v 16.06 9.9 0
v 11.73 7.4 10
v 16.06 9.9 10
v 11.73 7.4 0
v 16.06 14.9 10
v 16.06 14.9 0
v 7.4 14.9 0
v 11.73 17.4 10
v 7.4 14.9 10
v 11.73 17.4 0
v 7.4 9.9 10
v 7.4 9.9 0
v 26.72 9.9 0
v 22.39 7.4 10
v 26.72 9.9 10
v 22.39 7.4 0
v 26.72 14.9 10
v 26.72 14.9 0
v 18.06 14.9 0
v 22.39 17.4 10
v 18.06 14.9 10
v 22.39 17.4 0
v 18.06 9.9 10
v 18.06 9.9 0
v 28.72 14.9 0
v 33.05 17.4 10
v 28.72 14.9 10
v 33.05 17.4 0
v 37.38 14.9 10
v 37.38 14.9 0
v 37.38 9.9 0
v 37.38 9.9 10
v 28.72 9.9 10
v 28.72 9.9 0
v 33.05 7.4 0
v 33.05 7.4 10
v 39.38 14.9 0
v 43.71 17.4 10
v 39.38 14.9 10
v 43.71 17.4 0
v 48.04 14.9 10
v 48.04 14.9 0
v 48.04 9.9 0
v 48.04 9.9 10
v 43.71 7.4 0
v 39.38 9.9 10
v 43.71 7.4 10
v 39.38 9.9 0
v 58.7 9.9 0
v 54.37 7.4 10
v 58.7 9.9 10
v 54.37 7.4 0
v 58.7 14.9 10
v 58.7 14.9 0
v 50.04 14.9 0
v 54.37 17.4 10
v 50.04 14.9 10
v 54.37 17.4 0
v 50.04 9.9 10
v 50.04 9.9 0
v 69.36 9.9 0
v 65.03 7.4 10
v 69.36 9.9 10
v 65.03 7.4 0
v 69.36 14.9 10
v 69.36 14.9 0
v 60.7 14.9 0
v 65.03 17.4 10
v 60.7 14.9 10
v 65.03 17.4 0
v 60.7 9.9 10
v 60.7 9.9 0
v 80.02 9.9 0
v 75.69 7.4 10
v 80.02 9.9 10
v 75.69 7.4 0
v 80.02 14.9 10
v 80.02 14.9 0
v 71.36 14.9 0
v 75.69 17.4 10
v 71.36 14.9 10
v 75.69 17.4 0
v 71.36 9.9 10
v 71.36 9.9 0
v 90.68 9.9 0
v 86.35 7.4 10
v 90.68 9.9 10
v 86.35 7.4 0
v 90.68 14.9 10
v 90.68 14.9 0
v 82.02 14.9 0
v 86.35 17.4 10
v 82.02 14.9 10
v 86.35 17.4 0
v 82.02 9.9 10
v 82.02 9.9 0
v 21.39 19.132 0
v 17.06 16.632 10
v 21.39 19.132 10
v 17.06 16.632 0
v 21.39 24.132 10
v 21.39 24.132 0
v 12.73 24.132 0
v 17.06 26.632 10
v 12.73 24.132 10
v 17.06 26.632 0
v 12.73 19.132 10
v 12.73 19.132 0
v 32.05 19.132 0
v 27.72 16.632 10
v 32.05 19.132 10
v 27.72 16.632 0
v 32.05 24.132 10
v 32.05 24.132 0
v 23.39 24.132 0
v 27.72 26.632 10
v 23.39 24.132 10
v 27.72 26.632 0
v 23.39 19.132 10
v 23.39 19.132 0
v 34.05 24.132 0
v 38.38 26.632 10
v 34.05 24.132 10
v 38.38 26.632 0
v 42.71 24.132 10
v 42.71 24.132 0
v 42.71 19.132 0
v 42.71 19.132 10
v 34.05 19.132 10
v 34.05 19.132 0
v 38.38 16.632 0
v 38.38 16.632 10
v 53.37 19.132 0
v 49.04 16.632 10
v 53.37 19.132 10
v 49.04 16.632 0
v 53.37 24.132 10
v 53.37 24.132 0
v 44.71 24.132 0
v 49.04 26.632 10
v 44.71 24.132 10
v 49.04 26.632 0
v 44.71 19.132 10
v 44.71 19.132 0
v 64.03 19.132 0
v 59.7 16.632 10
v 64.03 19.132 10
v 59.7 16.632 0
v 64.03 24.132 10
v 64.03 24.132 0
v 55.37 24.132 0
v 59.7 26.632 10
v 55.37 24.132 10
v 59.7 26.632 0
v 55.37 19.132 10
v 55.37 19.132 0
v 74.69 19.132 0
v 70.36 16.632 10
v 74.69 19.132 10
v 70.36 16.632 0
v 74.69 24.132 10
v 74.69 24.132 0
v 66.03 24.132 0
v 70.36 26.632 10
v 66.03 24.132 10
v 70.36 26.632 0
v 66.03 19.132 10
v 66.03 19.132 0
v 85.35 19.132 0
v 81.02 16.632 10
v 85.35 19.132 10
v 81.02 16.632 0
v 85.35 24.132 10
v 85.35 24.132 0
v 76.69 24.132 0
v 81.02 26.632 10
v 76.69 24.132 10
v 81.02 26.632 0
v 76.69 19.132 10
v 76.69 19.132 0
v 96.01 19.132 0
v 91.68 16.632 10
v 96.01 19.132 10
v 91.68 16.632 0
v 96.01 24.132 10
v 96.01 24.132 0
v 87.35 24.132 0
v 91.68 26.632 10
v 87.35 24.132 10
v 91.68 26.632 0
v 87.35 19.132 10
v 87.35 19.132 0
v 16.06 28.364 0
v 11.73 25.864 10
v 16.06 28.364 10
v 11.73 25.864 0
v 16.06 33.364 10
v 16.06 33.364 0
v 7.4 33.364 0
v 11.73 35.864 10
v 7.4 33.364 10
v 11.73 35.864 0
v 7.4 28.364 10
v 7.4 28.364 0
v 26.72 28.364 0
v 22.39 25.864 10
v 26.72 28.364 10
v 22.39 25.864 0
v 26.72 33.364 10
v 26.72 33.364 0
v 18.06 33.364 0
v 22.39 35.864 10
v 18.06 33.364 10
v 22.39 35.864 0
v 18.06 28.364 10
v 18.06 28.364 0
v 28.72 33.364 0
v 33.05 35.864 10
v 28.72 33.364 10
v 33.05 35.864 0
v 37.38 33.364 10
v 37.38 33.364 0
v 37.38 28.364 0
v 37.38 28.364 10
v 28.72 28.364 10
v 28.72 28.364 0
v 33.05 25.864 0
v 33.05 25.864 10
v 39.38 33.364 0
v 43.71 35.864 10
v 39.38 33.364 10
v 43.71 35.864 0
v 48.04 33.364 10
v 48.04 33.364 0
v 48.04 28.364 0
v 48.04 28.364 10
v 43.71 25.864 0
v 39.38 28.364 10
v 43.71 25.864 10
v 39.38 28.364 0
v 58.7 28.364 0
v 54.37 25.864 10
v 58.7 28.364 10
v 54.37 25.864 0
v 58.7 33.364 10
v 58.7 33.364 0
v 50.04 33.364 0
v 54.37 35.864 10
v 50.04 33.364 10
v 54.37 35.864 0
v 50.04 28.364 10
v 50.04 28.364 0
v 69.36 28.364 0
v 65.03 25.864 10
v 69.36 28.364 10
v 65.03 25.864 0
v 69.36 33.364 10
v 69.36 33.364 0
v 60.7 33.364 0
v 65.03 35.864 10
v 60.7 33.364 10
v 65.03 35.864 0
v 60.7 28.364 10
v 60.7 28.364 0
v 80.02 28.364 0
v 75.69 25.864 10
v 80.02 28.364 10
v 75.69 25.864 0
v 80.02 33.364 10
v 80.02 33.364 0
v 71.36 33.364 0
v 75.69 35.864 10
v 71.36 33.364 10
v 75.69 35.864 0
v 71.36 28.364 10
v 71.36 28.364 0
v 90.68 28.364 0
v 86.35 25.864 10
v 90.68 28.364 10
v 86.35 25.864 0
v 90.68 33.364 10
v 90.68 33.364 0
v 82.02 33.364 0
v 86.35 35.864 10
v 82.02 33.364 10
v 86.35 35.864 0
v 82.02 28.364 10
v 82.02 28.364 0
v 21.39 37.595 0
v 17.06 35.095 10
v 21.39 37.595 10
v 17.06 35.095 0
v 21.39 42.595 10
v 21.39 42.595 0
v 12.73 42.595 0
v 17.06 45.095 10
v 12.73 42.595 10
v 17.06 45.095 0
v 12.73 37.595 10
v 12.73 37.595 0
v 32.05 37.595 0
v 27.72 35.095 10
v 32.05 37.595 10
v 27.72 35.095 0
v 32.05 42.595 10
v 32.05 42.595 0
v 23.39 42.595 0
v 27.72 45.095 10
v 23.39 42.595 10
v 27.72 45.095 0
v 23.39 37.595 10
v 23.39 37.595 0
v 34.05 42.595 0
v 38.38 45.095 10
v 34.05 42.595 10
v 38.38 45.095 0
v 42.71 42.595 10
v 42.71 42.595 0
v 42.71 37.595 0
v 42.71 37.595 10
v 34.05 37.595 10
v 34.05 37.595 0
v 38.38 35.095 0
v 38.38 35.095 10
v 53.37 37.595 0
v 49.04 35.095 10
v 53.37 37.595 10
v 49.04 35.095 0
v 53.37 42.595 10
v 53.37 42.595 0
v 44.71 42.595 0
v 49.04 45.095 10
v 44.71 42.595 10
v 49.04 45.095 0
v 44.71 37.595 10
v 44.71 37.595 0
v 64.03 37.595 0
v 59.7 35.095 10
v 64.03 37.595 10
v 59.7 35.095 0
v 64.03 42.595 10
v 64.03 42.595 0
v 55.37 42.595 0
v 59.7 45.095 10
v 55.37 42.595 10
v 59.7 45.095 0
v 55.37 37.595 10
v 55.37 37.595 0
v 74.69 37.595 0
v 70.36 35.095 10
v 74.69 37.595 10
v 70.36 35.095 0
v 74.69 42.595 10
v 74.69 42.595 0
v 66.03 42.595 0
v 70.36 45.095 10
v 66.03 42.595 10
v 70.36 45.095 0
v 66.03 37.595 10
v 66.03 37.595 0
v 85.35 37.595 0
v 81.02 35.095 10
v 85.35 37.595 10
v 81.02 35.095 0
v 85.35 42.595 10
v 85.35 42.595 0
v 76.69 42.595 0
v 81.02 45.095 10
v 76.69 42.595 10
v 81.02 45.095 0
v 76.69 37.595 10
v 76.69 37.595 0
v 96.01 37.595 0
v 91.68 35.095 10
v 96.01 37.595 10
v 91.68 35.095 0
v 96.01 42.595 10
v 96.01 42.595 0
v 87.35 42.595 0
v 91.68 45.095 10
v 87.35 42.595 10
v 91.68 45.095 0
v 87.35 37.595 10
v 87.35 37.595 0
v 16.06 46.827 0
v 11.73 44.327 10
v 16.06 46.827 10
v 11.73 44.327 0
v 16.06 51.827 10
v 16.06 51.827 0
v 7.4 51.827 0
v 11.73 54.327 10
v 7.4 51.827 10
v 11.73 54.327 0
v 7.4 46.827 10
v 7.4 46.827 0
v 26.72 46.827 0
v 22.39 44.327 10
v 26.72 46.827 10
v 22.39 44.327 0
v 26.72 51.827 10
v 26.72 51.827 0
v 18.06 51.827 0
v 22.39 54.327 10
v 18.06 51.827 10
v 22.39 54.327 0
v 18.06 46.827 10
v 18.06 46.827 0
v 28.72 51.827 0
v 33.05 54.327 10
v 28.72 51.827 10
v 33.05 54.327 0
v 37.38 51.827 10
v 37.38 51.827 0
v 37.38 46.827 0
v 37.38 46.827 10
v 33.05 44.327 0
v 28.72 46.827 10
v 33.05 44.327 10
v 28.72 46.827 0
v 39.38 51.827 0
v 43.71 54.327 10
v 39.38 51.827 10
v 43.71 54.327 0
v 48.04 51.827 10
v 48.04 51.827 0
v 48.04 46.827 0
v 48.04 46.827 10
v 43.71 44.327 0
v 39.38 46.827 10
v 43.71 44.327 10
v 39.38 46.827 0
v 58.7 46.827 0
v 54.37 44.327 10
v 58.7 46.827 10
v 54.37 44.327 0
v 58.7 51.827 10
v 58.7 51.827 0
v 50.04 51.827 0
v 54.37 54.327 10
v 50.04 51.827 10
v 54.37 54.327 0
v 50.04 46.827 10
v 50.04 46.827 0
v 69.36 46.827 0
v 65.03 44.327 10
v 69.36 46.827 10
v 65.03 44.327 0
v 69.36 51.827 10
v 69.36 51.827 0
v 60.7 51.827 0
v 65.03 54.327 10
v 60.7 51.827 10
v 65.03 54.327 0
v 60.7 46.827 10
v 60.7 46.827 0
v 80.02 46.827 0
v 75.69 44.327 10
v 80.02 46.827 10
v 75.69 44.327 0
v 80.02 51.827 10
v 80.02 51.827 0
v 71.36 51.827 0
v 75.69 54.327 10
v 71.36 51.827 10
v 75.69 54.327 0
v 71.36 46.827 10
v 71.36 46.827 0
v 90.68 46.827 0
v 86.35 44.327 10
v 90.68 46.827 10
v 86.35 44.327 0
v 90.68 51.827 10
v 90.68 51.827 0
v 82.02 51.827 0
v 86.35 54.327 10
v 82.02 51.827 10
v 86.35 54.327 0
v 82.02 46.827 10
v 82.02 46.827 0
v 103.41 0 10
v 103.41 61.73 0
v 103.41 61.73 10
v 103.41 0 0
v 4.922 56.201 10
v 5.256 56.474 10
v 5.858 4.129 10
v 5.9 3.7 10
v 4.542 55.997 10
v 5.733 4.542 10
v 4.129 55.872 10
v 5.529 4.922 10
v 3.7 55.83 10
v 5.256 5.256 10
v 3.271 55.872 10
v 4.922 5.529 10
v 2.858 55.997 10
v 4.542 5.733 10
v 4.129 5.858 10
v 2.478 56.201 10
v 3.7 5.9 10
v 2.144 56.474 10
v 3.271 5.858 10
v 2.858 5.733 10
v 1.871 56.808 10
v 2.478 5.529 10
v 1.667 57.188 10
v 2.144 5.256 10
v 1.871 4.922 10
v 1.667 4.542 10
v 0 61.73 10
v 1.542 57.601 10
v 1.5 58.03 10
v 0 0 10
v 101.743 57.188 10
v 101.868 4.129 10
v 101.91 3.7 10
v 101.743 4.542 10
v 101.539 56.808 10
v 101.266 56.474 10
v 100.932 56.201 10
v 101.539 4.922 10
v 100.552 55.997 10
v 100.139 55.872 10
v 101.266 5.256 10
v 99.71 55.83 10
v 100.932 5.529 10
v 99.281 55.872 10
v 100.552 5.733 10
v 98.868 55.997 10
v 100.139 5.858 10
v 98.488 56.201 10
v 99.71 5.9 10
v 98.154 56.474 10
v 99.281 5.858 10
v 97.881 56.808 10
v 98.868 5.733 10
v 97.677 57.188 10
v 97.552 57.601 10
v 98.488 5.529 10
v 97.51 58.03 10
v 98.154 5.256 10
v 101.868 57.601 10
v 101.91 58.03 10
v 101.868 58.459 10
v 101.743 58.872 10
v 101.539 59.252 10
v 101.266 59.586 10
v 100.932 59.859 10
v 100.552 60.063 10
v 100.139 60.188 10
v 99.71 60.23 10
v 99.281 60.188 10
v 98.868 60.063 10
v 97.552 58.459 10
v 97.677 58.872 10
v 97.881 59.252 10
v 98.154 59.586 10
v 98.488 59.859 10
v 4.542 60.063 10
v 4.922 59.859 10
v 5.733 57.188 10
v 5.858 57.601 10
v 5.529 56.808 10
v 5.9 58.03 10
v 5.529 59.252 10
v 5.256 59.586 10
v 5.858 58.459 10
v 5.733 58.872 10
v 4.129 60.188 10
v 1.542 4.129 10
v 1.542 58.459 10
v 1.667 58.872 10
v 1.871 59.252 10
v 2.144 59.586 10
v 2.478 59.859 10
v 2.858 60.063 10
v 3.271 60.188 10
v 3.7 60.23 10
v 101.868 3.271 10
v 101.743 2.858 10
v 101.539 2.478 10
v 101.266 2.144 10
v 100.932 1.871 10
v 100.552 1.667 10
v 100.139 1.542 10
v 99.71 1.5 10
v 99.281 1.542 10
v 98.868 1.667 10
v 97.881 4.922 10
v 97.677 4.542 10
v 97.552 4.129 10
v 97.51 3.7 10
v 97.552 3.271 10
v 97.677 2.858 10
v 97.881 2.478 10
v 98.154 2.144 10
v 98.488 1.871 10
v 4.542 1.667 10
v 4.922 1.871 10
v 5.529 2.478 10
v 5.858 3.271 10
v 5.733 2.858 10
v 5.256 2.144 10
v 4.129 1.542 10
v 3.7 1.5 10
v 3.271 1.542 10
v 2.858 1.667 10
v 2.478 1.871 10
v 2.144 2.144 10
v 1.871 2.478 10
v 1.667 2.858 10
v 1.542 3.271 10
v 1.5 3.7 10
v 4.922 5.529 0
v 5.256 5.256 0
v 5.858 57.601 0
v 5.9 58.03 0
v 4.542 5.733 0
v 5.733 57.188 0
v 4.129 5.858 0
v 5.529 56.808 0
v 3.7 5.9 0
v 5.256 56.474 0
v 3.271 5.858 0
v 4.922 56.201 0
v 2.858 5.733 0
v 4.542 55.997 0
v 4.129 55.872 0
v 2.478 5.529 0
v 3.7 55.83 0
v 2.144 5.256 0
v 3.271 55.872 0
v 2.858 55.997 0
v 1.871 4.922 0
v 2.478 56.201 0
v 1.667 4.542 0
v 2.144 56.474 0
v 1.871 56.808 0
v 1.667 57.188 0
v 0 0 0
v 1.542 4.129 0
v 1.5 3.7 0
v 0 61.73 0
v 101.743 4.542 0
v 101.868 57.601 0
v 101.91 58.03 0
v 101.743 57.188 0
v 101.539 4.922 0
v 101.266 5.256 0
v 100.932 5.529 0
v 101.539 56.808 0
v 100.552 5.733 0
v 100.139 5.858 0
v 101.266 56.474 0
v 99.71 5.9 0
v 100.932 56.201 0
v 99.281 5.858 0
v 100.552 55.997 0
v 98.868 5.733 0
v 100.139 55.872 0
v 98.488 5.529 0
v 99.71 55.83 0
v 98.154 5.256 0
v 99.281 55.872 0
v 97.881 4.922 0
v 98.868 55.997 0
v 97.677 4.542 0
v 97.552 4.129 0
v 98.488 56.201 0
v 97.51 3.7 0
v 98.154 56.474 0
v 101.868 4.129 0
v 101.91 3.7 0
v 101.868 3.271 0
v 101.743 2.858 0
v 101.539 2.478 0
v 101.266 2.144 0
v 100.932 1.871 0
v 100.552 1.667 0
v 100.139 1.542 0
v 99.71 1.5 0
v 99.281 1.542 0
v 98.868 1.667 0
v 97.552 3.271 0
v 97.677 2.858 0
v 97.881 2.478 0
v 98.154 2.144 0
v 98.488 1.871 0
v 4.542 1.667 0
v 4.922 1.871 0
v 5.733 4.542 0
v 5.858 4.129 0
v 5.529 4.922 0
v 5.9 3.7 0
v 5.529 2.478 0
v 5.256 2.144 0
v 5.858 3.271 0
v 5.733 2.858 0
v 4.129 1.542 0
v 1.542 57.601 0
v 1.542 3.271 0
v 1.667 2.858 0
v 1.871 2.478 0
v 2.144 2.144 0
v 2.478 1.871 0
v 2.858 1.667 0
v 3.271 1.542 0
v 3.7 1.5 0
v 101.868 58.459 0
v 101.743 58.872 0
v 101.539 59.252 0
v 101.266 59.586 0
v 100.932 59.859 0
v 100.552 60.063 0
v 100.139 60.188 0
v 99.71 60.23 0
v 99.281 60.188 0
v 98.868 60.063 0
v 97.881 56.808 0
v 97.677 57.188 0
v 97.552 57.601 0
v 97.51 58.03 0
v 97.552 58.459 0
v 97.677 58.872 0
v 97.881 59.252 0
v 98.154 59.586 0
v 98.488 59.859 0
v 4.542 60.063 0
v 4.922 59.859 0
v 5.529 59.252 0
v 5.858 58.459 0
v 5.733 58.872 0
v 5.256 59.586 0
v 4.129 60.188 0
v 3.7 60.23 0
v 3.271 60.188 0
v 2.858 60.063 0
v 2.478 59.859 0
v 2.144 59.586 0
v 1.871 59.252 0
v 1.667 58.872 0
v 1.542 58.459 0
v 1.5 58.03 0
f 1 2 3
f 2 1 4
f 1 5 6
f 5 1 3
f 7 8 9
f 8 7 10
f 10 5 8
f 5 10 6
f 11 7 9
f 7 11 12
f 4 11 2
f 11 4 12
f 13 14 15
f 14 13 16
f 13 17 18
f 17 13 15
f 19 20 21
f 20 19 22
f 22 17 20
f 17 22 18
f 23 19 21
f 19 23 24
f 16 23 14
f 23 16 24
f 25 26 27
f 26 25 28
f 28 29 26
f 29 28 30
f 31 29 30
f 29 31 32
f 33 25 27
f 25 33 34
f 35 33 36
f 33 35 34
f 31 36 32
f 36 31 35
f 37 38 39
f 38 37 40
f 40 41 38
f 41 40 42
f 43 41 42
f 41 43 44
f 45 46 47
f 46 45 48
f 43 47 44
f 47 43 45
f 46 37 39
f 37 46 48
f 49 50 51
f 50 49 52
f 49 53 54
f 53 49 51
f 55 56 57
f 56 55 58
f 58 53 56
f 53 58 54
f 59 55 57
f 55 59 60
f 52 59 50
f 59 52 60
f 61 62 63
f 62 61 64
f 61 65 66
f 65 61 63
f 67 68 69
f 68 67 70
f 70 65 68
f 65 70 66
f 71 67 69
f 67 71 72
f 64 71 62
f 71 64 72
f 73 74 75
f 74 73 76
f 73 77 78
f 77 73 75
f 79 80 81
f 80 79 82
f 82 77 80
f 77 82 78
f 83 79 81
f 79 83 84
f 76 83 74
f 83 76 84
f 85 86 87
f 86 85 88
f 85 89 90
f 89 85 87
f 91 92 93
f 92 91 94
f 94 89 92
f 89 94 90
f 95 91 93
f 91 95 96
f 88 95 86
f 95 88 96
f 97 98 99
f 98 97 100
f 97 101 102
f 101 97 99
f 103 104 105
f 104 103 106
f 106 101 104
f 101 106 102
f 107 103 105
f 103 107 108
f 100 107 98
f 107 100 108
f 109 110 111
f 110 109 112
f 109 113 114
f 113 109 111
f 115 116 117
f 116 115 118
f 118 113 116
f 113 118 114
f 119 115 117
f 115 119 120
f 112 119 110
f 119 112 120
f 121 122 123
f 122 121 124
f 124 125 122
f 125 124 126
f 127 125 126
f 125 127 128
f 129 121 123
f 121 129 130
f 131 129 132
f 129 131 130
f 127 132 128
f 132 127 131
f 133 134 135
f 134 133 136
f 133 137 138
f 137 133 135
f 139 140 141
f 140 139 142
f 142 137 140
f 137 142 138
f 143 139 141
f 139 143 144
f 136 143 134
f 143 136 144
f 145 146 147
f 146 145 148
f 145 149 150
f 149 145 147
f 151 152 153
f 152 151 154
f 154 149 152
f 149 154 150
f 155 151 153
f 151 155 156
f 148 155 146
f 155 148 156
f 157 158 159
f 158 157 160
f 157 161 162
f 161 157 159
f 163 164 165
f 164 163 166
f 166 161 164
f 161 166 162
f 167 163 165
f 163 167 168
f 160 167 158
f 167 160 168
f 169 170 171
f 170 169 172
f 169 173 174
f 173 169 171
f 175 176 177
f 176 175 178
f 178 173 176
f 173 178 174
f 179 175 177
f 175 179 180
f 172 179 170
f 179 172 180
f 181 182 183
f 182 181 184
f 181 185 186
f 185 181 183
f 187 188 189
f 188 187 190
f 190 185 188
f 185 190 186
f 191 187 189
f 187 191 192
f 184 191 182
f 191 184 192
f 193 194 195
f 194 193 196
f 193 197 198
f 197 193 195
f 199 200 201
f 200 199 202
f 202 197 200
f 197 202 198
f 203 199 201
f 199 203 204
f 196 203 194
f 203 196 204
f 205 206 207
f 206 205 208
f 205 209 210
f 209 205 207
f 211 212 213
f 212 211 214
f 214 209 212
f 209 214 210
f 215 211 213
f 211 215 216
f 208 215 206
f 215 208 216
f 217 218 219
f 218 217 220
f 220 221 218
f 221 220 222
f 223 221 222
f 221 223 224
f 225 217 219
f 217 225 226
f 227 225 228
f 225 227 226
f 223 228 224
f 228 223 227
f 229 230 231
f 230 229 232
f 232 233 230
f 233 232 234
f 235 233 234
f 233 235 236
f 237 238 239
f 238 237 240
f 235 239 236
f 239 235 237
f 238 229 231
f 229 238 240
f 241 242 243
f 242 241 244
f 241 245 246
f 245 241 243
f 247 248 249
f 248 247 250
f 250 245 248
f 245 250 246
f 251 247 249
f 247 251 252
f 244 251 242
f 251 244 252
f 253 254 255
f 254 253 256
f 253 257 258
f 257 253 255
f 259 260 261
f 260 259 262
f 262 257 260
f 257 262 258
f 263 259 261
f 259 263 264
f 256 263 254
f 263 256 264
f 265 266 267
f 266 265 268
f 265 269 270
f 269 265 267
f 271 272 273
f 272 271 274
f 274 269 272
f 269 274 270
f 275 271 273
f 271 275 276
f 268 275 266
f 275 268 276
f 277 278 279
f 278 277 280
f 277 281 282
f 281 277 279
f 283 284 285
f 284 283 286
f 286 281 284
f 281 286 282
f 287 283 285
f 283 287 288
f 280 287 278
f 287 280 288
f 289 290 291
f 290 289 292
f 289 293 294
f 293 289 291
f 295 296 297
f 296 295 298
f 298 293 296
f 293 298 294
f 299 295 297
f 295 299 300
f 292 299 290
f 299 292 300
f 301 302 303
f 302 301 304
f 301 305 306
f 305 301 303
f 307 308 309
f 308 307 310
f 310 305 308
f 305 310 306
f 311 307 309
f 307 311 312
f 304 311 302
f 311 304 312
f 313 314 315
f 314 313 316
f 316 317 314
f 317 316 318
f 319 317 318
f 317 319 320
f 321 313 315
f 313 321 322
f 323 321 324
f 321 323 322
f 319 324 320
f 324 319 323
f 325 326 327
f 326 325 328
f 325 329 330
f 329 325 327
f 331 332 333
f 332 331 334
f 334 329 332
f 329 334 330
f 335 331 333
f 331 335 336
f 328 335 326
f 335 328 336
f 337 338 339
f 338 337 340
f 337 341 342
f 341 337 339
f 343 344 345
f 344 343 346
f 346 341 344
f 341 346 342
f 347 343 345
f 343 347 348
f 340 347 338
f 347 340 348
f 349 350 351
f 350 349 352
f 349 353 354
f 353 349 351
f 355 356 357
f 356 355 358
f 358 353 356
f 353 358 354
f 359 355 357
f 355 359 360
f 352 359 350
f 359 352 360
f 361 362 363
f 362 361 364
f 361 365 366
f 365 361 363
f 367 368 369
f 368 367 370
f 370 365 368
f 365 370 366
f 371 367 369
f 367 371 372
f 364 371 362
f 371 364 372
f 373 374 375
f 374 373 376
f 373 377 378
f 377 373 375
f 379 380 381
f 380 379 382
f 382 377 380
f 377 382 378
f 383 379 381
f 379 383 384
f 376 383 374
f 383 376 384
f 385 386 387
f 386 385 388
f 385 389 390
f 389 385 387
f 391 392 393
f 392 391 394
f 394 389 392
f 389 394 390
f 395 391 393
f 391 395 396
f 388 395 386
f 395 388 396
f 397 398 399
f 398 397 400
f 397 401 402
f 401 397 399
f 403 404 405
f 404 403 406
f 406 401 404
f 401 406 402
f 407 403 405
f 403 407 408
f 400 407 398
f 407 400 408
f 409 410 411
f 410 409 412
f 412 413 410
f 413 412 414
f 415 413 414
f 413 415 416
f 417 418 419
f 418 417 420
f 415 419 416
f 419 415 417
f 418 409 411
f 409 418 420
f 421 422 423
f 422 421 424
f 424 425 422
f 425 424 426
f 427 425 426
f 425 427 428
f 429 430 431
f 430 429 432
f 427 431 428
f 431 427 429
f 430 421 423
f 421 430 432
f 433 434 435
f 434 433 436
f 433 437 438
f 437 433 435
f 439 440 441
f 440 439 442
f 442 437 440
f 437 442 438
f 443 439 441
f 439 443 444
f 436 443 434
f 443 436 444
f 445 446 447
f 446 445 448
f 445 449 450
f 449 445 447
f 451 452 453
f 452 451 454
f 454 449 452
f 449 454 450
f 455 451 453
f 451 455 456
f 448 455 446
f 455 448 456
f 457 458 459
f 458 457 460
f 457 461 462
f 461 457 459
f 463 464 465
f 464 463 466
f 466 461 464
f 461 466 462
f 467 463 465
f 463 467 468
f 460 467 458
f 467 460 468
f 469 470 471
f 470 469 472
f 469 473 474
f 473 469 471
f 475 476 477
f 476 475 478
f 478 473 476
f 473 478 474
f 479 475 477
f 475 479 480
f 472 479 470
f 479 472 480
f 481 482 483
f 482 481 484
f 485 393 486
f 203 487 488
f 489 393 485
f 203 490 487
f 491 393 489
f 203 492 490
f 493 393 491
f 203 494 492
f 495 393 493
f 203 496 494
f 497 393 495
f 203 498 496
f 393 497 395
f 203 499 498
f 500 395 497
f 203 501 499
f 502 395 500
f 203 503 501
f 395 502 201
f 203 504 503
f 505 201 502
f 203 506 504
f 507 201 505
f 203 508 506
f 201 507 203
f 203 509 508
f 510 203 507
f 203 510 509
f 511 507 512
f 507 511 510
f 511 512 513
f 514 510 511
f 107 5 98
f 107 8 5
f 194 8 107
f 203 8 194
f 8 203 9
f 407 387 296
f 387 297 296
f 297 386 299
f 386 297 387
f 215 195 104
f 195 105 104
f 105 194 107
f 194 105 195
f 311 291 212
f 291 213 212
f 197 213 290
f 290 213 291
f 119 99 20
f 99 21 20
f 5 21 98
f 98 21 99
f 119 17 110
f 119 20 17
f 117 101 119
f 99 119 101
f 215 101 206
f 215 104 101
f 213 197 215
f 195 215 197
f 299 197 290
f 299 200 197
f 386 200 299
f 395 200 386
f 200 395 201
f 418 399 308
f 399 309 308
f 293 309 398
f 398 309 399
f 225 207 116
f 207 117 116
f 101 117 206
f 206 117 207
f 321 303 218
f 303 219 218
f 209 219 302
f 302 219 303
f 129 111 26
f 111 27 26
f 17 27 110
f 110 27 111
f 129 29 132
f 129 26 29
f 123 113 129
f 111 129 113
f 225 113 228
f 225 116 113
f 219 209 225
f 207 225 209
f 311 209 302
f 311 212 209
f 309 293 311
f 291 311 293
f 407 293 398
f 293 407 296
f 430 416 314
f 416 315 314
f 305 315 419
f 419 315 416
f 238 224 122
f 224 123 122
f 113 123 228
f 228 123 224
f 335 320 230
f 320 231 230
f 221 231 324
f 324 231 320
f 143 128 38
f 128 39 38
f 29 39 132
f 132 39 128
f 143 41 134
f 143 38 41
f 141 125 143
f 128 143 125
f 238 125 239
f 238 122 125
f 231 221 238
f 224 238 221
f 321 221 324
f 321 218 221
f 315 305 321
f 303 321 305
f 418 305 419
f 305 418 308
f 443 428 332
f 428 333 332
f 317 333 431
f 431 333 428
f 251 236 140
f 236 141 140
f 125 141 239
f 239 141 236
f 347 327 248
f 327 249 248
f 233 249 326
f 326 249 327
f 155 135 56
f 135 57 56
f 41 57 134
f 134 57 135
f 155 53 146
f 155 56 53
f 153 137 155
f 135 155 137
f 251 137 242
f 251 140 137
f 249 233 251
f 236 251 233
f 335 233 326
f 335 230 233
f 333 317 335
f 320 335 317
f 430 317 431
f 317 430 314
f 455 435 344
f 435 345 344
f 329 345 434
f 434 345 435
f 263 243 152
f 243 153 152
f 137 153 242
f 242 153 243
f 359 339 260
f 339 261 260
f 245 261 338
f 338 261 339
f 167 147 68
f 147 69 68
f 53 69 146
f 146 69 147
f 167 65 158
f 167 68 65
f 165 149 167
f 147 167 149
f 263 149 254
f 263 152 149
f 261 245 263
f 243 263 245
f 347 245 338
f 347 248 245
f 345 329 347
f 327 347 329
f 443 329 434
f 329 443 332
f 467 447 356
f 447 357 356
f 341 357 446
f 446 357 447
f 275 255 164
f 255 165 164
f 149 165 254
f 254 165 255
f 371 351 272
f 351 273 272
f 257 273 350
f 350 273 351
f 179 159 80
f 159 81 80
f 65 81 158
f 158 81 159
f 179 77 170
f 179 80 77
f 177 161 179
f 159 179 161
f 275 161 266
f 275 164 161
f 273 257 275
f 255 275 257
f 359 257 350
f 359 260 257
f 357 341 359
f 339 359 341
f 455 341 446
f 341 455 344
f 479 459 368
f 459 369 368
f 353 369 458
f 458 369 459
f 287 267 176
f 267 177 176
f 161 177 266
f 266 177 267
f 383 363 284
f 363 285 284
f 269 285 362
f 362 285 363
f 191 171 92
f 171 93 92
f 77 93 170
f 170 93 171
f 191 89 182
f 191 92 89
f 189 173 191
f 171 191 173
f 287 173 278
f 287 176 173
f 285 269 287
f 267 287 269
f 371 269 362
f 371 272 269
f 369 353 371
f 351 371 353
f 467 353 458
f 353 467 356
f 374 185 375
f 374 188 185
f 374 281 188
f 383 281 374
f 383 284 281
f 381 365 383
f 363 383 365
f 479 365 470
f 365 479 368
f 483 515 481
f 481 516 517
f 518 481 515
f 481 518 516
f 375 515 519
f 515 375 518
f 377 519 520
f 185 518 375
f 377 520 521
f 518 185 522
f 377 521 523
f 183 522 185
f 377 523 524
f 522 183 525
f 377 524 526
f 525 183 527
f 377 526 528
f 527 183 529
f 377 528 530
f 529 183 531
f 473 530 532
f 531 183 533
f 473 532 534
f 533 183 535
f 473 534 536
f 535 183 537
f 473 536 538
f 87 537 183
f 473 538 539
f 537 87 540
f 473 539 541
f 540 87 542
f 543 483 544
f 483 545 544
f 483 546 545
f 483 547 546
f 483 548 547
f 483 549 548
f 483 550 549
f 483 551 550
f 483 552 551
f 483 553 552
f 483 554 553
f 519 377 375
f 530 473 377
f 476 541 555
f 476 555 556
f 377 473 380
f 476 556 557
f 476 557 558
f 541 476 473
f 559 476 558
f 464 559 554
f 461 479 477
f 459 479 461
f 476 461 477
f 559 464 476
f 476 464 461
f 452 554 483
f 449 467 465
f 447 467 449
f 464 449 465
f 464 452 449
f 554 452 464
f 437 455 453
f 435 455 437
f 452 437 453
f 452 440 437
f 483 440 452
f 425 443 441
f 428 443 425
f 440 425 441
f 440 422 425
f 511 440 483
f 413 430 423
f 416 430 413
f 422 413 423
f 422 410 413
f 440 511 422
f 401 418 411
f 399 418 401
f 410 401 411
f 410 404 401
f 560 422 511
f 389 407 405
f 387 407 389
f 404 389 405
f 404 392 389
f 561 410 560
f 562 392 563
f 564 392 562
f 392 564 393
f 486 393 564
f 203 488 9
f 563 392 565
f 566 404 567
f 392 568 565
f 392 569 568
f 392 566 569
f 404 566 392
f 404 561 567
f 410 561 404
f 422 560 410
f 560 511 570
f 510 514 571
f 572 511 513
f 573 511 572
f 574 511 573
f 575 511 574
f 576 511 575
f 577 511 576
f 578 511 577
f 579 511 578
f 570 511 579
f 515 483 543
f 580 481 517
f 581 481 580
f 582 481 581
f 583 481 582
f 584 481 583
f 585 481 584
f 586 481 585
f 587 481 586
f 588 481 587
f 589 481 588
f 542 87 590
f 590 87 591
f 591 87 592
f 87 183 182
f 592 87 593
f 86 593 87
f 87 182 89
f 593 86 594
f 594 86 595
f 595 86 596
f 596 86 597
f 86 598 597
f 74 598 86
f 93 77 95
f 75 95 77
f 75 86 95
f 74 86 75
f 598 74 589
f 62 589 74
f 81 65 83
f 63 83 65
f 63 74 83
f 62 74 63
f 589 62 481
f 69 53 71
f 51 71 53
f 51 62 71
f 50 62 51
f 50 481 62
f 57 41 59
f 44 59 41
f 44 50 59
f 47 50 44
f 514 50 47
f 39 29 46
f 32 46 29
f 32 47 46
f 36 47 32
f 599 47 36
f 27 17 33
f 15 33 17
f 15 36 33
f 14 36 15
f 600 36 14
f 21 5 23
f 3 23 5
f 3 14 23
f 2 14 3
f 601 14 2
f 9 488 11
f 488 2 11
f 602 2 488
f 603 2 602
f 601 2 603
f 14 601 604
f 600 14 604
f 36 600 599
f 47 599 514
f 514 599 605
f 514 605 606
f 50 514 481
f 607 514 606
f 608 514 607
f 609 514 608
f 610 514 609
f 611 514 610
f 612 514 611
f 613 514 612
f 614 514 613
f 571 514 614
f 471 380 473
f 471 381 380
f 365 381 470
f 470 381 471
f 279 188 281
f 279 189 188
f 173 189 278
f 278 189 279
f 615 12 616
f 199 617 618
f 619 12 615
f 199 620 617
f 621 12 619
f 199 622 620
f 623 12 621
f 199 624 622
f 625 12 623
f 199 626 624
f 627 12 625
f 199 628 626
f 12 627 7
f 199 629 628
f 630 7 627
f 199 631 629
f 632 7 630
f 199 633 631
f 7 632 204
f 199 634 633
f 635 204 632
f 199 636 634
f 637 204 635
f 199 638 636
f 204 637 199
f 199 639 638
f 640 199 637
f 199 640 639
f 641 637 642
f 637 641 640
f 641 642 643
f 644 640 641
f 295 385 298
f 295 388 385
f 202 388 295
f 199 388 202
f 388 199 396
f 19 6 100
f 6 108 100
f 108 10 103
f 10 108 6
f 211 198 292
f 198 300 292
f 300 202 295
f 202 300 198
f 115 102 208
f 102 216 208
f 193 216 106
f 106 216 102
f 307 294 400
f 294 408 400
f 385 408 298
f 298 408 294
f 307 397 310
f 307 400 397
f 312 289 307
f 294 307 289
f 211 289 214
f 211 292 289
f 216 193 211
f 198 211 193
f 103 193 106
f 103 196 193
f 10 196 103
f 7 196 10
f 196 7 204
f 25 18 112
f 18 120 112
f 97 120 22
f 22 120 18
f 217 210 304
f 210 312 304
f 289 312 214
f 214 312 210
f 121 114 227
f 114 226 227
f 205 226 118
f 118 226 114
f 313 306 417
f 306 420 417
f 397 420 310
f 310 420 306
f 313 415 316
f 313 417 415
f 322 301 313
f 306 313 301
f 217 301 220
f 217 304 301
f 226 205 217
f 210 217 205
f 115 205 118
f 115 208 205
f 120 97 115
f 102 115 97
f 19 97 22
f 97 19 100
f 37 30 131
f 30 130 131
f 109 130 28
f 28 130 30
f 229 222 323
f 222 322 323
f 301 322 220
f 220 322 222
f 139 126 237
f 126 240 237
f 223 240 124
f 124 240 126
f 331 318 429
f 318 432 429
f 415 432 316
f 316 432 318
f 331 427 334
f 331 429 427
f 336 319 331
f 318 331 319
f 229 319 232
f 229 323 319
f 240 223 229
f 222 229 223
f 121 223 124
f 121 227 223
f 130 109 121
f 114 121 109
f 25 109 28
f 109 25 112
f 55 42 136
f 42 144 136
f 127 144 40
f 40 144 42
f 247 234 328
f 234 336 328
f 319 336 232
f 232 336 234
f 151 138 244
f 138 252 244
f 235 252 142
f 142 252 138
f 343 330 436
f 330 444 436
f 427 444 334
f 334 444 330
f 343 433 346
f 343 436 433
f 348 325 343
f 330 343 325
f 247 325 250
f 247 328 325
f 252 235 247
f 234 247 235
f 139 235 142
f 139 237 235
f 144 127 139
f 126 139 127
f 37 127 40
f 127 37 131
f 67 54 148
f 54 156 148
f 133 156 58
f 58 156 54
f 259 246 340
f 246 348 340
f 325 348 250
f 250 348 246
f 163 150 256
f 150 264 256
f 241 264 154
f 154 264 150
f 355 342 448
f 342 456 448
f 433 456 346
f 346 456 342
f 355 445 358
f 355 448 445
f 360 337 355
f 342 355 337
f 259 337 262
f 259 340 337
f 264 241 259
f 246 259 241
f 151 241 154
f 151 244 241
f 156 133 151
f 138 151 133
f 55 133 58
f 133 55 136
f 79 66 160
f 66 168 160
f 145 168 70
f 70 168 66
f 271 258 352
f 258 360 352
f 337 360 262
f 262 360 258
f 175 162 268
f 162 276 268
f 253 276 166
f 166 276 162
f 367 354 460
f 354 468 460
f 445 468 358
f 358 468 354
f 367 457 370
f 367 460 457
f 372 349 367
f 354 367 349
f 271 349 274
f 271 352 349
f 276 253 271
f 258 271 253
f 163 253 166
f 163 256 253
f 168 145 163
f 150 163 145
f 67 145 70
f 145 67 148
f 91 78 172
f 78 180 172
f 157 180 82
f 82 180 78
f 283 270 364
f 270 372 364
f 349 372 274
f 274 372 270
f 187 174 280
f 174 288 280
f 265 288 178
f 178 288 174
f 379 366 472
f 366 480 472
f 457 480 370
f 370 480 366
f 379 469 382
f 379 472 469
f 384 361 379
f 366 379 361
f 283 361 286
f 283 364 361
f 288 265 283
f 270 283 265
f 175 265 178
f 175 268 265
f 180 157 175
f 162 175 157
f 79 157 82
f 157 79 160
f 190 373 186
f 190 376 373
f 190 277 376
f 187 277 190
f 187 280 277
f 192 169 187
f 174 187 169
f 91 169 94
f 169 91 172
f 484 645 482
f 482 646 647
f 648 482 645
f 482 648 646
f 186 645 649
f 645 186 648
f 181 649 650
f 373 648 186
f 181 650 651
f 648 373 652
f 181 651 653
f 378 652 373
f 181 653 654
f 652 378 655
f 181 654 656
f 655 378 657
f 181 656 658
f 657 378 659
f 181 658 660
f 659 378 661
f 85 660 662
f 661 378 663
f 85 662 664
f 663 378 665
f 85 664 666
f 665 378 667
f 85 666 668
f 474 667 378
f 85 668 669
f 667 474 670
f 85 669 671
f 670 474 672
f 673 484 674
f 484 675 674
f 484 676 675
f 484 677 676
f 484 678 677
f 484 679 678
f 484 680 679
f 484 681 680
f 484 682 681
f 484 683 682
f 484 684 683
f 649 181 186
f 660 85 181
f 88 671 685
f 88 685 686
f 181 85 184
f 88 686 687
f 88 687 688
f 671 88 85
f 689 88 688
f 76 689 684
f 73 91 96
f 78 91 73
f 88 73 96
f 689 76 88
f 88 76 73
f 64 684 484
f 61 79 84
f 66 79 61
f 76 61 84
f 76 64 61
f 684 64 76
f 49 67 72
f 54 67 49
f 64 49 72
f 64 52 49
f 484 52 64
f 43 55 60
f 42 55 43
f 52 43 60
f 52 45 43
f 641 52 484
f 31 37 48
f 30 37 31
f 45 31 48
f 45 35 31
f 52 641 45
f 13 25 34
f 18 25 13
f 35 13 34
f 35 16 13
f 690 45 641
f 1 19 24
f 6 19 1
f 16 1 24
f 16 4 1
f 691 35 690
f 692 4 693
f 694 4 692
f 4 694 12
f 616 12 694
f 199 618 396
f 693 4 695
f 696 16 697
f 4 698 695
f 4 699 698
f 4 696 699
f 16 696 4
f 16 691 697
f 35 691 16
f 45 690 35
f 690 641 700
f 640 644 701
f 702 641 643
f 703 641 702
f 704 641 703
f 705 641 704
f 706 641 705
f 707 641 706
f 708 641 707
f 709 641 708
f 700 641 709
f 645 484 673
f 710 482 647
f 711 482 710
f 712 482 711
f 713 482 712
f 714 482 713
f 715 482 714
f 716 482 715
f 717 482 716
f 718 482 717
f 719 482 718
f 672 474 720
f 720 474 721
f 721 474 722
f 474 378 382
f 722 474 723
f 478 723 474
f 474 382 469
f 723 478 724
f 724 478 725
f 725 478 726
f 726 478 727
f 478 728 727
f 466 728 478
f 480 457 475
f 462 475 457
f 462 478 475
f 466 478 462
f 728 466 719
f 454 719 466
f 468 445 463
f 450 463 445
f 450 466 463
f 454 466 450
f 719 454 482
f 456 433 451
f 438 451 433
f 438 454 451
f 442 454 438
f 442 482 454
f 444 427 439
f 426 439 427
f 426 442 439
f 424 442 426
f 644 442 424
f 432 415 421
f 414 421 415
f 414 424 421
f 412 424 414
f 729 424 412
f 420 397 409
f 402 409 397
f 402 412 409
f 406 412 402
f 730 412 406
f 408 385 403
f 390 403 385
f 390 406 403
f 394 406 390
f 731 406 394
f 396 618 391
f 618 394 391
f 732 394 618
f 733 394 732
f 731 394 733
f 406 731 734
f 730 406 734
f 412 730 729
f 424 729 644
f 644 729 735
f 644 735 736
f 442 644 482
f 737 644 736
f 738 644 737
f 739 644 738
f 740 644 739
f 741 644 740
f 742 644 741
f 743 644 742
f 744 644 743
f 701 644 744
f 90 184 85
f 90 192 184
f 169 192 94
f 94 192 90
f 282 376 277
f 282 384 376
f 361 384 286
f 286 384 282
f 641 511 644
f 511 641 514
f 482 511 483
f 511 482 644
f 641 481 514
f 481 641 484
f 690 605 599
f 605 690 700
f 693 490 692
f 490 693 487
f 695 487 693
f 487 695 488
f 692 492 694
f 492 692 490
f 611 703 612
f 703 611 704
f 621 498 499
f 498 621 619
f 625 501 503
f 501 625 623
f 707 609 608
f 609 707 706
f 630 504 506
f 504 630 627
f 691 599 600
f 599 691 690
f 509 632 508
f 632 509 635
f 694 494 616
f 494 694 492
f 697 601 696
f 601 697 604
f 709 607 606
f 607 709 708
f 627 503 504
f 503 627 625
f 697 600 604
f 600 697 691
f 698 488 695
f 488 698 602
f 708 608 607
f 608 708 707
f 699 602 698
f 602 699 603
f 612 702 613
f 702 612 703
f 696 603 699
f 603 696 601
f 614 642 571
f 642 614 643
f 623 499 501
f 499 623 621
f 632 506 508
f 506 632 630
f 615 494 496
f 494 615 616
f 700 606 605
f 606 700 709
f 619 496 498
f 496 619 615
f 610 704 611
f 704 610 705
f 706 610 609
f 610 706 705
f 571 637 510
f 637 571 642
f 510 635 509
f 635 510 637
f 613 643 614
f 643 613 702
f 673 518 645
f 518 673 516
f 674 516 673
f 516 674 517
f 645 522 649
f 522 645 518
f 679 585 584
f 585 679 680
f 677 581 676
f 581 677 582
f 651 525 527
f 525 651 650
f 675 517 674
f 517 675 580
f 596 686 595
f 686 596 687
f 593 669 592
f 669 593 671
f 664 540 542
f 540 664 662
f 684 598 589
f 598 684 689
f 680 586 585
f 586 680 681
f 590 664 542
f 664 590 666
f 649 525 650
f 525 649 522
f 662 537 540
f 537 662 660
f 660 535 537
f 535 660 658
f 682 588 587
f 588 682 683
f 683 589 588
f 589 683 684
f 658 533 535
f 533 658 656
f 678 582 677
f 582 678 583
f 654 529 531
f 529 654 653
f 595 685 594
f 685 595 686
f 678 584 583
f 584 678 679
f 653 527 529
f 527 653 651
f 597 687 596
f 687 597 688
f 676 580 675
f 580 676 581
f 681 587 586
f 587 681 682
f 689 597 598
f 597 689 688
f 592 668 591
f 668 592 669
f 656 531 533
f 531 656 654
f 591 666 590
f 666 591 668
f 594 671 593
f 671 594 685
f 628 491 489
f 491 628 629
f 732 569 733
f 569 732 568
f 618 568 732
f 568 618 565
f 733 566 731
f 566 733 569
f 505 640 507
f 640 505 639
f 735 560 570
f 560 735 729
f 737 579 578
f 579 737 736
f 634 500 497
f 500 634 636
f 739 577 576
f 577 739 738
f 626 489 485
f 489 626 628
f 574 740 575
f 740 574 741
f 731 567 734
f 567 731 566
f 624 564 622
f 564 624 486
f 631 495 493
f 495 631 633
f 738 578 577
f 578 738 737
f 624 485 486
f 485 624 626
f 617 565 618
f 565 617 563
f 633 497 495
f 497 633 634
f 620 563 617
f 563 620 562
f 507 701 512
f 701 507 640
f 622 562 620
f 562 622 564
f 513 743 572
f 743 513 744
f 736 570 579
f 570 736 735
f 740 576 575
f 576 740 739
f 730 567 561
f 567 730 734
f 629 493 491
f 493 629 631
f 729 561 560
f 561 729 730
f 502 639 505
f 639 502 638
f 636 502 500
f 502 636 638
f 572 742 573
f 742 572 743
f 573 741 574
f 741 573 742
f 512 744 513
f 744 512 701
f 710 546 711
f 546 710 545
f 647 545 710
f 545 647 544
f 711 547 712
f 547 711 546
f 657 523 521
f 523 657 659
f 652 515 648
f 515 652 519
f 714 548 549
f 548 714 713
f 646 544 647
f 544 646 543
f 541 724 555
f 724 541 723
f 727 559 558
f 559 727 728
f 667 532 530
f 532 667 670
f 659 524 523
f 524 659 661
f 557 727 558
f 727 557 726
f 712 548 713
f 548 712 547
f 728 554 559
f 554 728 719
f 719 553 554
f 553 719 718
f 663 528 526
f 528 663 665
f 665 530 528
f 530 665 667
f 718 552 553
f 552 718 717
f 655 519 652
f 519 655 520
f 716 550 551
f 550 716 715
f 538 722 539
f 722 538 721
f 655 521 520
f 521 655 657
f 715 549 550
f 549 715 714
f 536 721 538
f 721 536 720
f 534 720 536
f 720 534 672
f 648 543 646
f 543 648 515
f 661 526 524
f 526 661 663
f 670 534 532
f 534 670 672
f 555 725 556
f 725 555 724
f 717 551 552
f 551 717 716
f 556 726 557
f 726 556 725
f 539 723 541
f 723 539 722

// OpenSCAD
$fn = 32;

// ----------------------------------------------------------------------
// Honeycomb panel: 103.41 x 61.73 mm, 40 cells of 10 mm
// ----------------------------------------------------------------------

// --- parameters (mm) ---
panel_w = 103.41;         // panel width
panel_d = 61.73;          // panel depth
thick = 10;               // panel thickness
cell_r = 5;               // hex cell circumradius
pitch = 10.66;            // hex cell pitch (centre to centre)
web = 2;                  // web between the cells
columns = 8;              // columns of cells
rows = 5;                 // rows of cells
cell_count = 40;          // total cells
shift_x = 11.73;          // first cell offset in x
shift_y = 12.4;           // first cell offset in y
mount_d = 4.4;            // corner mounting holes
hole_off = 3.7;           // mounting hole offset from the corners

difference() {
  union() {
    cube([panel_w, panel_d, thick]);
  }
  /* hexagonal cells, point-up, cut right through the plate */
  for (row = [0 : rows - 1]) {
    for (col = [0 : columns - 1]) {
      translate([shift_x + col * pitch + (row % 2) * pitch / 2, shift_y + row * pitch * 0.866025, -2.5]) rotate([0, 0, 30]) cylinder(h = thick + 5, d = 2 * cell_r, $fn = 6);
    }
  }
  /* corner mounting holes, clear of the outer cell web */
  translate([3.7, 3.7, -2.5]) cylinder(h = thick + 5, d = mount_d);
  translate([99.71, 3.7, -2.5]) cylinder(h = thick + 5, d = mount_d);
  translate([3.7, 58.03, -2.5]) cylinder(h = thick + 5, d = mount_d);
  translate([99.71, 58.03, -2.5]) cylinder(h = thick + 5, d = mount_d);
}
